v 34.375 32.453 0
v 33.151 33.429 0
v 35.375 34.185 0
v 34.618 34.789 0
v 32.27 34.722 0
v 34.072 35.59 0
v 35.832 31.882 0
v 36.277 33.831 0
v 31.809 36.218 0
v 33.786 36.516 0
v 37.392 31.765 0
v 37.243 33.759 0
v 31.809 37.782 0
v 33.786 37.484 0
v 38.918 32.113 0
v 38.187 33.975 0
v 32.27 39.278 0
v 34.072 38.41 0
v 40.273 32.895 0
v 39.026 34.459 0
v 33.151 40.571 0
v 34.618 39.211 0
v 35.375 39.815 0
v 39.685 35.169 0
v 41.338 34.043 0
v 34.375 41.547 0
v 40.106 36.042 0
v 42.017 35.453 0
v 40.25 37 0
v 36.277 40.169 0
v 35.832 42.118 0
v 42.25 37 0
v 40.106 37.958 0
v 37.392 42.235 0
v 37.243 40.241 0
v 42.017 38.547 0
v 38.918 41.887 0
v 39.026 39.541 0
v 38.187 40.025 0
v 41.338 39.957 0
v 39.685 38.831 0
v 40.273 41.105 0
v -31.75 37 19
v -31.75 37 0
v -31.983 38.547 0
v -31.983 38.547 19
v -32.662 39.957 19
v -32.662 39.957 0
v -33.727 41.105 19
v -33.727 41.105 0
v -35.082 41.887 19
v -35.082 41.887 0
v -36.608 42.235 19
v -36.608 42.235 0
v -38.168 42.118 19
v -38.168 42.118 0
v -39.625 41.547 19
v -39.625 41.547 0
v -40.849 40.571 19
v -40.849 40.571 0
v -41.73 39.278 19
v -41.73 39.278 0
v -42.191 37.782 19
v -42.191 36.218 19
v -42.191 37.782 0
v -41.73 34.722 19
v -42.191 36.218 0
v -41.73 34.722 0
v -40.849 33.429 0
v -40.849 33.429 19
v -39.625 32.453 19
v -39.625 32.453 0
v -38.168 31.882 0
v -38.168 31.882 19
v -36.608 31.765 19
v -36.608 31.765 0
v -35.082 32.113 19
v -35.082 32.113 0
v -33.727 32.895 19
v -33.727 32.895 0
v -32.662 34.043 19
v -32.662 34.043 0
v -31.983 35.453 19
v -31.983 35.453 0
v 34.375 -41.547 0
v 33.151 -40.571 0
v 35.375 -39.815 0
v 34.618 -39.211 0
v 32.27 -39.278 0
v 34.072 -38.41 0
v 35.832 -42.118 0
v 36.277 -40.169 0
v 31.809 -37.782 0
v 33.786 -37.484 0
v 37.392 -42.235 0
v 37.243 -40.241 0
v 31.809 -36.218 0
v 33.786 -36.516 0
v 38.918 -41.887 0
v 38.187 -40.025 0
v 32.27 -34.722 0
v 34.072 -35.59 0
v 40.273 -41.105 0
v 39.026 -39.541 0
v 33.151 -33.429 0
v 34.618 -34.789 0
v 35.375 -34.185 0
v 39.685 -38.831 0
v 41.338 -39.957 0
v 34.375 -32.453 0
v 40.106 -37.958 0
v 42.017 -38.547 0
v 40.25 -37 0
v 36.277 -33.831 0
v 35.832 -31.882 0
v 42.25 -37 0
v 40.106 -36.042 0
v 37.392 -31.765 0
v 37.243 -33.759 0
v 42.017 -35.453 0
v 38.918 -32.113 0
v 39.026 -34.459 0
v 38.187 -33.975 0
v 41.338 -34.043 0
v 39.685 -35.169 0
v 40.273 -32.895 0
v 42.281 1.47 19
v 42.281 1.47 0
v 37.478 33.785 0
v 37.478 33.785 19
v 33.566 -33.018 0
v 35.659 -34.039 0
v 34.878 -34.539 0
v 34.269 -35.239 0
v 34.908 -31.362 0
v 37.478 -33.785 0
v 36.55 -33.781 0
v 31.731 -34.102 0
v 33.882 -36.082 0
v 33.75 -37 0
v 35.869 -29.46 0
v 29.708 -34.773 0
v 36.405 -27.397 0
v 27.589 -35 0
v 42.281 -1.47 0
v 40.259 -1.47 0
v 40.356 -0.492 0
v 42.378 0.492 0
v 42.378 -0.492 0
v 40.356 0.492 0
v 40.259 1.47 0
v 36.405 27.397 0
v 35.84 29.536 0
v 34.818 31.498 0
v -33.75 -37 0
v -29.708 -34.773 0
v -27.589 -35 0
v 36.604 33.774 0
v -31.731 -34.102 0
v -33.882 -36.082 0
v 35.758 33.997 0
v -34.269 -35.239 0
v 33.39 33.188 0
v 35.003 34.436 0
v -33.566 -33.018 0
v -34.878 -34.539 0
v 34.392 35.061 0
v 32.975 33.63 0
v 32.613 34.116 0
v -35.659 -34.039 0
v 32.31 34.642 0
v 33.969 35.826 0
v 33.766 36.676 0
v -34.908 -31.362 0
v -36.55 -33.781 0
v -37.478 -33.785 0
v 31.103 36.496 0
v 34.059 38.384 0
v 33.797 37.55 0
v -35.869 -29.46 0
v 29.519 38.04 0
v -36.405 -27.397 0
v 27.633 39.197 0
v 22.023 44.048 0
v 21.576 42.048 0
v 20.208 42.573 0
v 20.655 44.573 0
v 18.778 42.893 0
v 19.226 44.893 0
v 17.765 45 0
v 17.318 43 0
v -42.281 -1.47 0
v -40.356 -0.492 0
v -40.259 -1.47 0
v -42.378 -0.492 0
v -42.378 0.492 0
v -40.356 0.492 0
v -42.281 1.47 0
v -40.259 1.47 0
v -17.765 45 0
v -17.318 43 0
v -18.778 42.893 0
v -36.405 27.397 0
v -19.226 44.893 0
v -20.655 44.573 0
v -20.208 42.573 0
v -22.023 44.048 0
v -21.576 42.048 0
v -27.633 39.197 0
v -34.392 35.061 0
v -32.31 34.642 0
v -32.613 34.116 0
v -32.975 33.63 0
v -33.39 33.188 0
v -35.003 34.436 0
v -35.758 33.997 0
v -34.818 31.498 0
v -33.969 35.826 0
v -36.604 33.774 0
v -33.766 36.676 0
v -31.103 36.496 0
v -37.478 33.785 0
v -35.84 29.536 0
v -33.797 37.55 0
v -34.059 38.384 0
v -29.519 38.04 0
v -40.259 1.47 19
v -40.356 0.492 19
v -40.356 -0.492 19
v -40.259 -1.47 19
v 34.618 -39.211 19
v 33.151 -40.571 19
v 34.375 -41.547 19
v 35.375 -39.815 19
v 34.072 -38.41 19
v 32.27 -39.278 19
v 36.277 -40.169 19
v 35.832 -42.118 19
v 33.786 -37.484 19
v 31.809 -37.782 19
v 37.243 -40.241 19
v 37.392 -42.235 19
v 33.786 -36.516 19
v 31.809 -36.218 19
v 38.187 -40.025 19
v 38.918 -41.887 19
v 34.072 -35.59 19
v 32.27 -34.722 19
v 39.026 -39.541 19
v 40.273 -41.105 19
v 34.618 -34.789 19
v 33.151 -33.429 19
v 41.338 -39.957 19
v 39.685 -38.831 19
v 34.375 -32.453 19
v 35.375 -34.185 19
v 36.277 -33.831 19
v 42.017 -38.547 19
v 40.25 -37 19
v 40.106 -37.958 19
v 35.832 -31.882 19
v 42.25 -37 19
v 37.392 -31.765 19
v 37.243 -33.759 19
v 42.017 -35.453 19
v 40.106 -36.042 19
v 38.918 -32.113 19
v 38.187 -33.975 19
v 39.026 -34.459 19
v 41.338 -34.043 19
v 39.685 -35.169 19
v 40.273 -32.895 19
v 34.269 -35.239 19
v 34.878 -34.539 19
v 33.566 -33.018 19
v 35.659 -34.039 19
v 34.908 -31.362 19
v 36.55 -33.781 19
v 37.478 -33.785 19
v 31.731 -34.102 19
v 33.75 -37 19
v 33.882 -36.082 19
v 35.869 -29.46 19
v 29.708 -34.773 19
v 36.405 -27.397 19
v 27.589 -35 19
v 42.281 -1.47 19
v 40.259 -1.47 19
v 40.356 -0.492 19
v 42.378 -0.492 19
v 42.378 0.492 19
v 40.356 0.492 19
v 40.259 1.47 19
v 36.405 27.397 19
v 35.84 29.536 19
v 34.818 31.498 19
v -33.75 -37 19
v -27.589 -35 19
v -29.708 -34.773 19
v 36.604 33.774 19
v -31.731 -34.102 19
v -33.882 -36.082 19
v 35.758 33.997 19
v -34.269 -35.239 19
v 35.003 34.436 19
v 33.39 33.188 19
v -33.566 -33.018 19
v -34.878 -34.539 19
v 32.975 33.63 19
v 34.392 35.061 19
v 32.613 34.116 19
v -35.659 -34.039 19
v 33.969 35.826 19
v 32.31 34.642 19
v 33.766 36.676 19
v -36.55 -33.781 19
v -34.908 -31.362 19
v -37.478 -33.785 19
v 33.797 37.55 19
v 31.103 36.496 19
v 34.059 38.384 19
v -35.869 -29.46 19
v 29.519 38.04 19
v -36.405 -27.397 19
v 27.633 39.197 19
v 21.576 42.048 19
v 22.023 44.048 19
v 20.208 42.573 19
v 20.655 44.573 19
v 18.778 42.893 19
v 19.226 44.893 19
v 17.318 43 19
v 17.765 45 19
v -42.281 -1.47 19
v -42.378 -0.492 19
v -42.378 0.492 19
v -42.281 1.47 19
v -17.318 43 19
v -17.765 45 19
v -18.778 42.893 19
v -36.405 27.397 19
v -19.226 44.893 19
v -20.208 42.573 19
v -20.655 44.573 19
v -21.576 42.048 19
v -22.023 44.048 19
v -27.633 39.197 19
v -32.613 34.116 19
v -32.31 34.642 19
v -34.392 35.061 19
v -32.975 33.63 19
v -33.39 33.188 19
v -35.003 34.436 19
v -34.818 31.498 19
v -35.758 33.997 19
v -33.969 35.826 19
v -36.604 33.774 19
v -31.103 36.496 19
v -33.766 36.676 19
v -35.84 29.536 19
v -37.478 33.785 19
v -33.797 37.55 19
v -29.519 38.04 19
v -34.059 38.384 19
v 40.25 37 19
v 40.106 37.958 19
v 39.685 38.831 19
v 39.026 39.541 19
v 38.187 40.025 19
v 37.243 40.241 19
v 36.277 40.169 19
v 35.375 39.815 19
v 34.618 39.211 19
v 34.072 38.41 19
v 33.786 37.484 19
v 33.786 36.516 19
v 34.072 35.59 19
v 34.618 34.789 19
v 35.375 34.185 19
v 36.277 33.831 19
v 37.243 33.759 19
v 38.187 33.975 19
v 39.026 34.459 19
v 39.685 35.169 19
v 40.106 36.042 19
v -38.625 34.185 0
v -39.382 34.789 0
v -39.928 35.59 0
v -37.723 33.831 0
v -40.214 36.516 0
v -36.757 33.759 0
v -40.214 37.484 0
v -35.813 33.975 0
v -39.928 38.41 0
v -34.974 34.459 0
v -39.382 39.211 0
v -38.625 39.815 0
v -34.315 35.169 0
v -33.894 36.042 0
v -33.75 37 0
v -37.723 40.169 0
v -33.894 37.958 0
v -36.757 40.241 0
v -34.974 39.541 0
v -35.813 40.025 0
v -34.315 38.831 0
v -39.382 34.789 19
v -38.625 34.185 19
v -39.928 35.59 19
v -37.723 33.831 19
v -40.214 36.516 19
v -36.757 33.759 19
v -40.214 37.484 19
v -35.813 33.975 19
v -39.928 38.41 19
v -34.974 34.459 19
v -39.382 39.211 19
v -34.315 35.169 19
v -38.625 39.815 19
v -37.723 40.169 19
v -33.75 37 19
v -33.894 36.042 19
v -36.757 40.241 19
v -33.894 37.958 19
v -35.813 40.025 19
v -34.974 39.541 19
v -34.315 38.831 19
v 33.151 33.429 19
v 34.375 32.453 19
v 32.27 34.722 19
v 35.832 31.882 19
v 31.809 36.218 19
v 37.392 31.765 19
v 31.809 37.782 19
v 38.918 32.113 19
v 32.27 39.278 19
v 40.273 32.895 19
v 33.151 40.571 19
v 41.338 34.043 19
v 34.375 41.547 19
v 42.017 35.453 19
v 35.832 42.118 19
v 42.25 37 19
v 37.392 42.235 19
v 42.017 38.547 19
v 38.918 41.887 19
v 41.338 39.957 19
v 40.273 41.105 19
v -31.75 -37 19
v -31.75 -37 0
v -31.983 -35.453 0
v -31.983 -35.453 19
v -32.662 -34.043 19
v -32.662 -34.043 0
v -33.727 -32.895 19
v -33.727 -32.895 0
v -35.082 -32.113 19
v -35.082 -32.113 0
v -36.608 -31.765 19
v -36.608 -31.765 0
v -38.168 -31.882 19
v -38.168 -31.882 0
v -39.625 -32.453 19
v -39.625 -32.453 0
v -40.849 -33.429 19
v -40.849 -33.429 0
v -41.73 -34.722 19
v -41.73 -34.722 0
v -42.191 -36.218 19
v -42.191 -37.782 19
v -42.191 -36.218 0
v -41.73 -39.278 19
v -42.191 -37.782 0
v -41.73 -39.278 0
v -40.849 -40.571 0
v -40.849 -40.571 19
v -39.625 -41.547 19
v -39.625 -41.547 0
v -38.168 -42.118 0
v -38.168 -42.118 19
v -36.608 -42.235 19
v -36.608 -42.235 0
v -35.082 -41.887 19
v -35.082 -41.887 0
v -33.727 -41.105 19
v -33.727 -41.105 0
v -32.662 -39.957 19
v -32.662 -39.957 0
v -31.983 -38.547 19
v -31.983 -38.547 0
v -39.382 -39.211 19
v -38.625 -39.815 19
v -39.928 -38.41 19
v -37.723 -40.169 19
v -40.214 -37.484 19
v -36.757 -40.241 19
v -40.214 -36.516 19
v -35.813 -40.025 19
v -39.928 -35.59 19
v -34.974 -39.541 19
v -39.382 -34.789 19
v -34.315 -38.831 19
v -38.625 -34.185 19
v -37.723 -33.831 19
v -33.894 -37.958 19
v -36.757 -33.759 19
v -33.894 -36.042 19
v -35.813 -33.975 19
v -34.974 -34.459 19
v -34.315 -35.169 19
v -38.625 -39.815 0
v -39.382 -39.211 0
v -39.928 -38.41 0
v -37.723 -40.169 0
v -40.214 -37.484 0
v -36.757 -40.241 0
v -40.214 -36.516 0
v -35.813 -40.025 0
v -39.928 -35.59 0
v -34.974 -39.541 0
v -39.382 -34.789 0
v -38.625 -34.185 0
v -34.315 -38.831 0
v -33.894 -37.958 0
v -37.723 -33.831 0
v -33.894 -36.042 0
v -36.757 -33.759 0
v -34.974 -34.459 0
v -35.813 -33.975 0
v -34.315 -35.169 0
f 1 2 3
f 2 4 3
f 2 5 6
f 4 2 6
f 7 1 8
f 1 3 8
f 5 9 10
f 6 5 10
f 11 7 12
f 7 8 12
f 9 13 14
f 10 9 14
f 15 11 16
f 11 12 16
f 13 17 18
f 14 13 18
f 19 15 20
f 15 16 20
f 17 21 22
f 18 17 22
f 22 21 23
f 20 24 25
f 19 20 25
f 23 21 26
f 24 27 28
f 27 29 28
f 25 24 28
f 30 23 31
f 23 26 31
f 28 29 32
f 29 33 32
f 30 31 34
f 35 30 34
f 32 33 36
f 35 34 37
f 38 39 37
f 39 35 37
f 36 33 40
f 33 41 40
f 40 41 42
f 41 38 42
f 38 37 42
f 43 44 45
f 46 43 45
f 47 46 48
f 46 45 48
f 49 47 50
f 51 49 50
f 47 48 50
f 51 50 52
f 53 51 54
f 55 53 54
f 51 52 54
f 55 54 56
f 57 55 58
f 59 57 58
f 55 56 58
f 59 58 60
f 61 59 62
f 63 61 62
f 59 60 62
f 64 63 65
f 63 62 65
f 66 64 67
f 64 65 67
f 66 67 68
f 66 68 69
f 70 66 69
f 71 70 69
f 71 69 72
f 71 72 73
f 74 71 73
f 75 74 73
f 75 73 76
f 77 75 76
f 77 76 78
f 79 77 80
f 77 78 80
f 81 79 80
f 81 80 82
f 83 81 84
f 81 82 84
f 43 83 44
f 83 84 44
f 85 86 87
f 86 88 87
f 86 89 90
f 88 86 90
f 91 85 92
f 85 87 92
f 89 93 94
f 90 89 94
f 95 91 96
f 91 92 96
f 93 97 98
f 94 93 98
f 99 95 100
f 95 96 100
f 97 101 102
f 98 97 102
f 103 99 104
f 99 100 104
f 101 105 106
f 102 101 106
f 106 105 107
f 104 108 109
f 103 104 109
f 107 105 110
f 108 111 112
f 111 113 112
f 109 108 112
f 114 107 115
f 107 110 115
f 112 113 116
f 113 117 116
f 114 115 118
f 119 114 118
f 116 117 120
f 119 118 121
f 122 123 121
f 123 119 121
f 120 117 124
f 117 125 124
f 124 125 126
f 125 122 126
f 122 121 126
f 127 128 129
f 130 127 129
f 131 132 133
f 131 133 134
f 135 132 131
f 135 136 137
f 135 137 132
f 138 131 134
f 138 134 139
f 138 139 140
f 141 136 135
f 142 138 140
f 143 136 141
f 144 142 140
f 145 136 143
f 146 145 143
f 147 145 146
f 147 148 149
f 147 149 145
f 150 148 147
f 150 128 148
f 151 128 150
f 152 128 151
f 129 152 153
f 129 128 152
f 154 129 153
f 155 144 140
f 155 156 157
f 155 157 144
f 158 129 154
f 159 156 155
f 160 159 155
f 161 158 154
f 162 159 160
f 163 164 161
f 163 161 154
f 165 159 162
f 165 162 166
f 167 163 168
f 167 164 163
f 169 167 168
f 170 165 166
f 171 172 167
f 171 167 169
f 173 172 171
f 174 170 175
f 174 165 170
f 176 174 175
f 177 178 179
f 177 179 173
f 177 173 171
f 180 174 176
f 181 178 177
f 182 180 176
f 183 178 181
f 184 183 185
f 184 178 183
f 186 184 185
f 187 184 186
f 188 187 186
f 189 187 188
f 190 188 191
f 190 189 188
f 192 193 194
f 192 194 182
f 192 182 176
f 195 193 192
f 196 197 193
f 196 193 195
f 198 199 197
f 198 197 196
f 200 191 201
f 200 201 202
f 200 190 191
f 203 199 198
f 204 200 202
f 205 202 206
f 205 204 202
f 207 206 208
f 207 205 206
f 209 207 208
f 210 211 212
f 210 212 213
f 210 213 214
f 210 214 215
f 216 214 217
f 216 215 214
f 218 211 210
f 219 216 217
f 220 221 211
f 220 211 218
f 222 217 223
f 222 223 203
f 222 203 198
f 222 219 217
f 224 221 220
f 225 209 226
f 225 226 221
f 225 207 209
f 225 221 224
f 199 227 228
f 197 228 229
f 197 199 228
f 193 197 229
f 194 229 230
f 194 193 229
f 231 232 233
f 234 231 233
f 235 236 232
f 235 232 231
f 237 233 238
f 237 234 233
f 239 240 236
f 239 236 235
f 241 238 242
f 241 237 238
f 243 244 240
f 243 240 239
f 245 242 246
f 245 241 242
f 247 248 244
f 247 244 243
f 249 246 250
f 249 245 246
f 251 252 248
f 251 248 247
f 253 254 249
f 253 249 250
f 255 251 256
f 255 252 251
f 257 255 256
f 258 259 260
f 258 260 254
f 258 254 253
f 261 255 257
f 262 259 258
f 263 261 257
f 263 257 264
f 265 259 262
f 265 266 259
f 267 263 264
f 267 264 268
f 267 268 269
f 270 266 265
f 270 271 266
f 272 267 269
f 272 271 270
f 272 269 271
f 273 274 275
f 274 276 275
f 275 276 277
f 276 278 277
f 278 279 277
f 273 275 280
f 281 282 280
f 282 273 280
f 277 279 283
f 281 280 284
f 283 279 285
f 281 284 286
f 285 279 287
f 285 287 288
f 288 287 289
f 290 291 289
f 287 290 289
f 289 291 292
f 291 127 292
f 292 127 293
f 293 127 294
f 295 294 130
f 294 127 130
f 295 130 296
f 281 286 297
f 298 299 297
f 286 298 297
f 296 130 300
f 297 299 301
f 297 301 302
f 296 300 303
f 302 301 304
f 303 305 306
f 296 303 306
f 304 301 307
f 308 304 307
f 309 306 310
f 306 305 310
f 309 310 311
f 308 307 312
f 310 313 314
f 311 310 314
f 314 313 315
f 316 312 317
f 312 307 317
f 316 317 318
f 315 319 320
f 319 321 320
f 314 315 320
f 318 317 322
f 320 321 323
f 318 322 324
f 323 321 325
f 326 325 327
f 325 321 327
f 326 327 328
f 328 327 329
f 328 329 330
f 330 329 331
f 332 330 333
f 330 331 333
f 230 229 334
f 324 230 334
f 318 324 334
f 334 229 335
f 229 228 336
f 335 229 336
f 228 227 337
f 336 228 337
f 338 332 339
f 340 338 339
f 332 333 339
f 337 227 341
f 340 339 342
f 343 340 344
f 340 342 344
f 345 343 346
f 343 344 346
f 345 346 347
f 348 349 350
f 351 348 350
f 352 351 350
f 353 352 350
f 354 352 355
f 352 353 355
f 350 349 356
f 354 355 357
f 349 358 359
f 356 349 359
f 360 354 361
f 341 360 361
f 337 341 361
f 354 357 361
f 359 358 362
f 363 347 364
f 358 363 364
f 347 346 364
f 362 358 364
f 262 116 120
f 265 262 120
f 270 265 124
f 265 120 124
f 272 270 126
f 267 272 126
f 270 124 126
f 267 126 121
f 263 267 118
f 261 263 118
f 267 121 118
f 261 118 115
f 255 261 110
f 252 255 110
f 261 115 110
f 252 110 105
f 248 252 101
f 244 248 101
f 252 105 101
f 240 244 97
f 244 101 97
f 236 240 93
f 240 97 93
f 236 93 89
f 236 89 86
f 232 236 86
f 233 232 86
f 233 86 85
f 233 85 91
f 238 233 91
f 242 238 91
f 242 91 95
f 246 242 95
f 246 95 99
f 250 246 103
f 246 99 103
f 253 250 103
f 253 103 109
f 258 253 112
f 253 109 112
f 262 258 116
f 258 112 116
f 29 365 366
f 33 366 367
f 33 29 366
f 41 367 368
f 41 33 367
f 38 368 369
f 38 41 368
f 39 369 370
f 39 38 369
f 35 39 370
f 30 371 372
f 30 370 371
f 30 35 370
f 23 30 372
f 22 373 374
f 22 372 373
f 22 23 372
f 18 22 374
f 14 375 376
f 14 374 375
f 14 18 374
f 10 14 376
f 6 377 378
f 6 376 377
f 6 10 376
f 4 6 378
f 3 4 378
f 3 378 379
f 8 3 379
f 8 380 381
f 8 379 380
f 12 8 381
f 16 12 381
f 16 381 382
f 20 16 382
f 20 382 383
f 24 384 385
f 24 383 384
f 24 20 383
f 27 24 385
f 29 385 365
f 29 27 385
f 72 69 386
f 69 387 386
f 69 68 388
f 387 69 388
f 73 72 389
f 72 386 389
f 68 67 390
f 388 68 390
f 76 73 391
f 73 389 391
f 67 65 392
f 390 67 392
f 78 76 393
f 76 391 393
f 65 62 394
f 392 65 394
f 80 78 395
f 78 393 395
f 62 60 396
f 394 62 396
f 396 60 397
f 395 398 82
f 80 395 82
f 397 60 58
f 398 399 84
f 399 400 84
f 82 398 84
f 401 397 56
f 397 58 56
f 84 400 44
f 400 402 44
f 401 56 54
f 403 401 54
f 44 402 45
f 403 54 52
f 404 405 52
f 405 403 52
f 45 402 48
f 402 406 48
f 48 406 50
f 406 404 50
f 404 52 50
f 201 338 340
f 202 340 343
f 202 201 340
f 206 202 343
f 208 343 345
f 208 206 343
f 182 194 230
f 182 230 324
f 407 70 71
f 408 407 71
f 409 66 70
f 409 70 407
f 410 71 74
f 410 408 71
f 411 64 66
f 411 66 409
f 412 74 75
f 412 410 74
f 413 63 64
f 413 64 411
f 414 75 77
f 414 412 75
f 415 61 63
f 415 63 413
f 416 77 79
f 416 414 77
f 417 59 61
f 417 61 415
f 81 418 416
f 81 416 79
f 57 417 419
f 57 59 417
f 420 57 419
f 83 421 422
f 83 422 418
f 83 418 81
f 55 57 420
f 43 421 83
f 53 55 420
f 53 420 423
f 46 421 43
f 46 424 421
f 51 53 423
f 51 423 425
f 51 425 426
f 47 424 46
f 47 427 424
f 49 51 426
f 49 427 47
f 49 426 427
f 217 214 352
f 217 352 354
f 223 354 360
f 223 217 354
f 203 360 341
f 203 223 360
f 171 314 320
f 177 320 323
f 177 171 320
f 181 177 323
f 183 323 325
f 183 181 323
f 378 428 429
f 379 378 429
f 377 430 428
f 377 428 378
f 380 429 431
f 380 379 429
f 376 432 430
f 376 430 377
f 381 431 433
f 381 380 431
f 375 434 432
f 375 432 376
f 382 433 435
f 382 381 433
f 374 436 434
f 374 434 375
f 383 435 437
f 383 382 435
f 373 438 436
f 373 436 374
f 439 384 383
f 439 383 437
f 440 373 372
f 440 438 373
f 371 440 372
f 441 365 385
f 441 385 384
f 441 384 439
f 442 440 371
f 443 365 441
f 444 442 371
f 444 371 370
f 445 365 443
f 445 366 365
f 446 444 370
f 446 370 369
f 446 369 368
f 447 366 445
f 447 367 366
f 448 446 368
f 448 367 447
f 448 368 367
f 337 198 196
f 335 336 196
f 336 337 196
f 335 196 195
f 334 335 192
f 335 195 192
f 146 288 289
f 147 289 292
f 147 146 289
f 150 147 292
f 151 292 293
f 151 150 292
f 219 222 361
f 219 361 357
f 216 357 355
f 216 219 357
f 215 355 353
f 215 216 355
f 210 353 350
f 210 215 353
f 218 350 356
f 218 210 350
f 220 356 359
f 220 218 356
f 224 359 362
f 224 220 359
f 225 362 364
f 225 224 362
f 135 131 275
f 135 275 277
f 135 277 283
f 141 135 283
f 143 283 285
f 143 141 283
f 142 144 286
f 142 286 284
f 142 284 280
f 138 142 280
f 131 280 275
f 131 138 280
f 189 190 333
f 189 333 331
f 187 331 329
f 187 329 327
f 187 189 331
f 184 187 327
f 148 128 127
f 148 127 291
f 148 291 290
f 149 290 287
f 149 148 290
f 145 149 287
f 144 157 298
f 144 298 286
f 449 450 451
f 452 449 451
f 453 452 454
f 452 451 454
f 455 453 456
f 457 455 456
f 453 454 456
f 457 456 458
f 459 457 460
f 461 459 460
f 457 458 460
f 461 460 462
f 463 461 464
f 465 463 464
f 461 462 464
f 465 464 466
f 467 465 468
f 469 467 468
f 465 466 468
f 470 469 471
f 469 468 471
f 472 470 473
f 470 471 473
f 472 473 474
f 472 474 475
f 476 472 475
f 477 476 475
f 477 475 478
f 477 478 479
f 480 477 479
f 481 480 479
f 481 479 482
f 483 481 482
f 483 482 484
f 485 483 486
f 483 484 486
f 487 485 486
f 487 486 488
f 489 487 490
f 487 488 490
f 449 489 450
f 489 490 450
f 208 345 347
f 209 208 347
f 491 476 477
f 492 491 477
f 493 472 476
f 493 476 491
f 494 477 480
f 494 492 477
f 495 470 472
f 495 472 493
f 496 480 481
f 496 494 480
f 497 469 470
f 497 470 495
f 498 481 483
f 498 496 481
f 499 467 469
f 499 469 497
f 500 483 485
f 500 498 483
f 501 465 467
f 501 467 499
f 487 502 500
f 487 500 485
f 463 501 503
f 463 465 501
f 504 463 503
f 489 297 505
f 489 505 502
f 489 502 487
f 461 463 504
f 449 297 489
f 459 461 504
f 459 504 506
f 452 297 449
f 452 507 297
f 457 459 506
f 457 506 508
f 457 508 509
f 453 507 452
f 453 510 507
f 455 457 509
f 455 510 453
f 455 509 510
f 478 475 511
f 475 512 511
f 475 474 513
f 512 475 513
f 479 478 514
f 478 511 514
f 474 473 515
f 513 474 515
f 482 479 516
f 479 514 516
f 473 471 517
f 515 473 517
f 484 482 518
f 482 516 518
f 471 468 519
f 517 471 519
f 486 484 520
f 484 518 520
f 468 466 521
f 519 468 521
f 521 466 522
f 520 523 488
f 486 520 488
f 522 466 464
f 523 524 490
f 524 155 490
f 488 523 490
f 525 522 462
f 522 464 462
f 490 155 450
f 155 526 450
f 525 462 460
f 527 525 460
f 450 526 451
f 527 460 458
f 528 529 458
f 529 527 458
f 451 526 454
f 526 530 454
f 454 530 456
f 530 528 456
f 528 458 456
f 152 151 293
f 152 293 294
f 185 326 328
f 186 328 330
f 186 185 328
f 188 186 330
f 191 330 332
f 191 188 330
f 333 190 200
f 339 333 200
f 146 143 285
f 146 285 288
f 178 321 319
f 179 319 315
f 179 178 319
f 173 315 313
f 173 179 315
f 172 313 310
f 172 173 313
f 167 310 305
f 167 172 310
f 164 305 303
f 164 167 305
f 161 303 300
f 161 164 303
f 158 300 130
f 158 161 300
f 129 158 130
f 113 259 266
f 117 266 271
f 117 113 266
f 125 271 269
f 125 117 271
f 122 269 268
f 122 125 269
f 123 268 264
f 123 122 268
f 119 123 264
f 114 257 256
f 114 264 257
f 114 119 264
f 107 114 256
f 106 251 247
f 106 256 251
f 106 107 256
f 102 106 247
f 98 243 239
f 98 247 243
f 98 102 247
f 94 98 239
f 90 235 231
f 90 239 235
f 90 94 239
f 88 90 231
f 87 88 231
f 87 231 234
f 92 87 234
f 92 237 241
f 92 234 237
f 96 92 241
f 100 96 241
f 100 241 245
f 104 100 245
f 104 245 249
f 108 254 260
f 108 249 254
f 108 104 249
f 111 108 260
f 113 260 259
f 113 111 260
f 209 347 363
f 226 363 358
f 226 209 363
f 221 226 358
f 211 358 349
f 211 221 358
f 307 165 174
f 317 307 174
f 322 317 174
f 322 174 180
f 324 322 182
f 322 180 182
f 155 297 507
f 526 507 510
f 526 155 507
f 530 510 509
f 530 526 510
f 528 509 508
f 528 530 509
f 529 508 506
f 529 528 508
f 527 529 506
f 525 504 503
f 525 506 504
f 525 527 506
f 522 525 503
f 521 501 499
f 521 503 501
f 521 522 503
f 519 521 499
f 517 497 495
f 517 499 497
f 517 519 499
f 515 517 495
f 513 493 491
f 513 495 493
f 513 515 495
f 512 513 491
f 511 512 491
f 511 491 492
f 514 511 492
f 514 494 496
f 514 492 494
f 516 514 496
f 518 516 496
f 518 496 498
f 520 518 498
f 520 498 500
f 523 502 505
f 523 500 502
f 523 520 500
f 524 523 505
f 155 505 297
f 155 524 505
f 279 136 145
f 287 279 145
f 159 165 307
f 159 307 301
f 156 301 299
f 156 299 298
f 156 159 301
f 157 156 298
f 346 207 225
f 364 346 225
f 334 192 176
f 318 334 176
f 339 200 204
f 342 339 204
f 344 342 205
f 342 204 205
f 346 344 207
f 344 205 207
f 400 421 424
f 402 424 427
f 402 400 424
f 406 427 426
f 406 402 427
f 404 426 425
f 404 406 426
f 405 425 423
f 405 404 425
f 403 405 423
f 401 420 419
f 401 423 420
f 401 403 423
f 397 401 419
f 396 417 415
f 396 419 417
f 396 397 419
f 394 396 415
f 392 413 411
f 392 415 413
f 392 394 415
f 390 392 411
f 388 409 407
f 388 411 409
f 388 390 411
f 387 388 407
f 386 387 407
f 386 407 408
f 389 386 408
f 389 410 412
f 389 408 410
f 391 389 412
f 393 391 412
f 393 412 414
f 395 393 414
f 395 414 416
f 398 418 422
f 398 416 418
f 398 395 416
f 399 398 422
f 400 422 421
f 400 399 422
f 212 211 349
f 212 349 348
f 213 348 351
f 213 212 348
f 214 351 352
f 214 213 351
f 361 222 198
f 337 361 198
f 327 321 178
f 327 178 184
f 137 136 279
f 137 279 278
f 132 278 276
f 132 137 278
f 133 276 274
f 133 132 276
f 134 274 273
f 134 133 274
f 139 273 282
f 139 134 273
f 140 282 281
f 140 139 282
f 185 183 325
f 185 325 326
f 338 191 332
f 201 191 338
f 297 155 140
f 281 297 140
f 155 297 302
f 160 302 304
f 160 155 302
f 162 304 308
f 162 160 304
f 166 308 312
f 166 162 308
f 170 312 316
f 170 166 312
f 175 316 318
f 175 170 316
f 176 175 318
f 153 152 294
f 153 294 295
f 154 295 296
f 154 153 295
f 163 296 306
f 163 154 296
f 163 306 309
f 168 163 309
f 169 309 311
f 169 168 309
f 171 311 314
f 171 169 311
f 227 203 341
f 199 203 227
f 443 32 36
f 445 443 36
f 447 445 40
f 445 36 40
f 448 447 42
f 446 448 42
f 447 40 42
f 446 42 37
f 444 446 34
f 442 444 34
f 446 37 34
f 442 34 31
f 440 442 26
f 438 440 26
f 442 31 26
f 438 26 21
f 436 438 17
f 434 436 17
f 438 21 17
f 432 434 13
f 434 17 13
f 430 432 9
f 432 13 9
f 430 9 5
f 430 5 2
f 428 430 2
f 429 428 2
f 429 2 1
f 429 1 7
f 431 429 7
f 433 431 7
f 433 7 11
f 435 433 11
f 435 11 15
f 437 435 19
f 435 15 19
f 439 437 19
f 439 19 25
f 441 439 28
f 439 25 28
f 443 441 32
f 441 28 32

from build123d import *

# Parameters (mm, degrees)
F0_R        = 5.25
F1_DEPTH    = 19
F3_DEPTH    = 19
F4_R        = 3.25
F5_DEPTH    = 25
F7_DEPTH    = 25
F8_T1_DEPTH = 19
F8_T3_DEPTH = 26.4324324324
F8_T5_DEPTH = 30.1768389253


# Not quite as in the source:
# - a fillet or chamfer that OpenCascade refuses, or shapes differently, is made with other operations: its cross-section is extruded or revolved along the edge and cut away or added


with BuildPart() as f1:
    # F0 (on Top) → F1 (new body)
    with BuildSketch(Plane.XY):
        with Locations((-37, 37)):
            Circle(F0_R)
    extrude(amount=F1_DEPTH)


with BuildPart() as f1b:
    # F0 (on Top) → F1, piece 2 (new body)
    with BuildSketch(Plane.XY):
        with Locations((37, 37)):
            Circle(F0_R)
    extrude(amount=F1_DEPTH)


with BuildPart() as f1c:
    # F0 (on Top) → F1, piece 3 (new body)
    with BuildSketch(Plane.XY):
        with Locations((37, -37)):
            Circle(F0_R)
    extrude(amount=F1_DEPTH)


with BuildPart() as f1d:
    # F0 (on Top) → F1, piece 4 (new body)
    with BuildSketch(Plane.XY):
        with Locations((-37, -37)):
            Circle(F0_R)
    extrude(amount=F1_DEPTH)


with BuildPart() as f3:
    # F2 (on Top) → F3 (new body)
    with BuildSketch(Plane.XY):
        Polygon((20, 45), (-20, 45), (-37, 37), (-42.5, 0), (-37, -37), (37, -37), (42.5, 0), (37, 37), align=None)
    extrude(amount=F3_DEPTH)


with BuildPart() as f5_tool:
    # F4 (on Top) → F5 (new body)
    with BuildSketch(Plane.XY):
        with Locations((-37, 37)):
            Circle(F4_R)
        with Locations((37, 37)):
            Circle(F4_R)
        with Locations((37, -37)):
            Circle(F4_R)
        with Locations((-37, -37)):
            Circle(F4_R)
    extrude(amount=F5_DEPTH)


with BuildPart() as f1_1:
    add(f1.part)

    # F5: cut by f5_tool
    add(f5_tool.part, mode=Mode.SUBTRACT)


with BuildPart() as f1b_1:
    add(f1b.part)

    # F5: cut by f5_tool
    add(f5_tool.part, mode=Mode.SUBTRACT)


with BuildPart() as f1c_1:
    add(f1c.part)

    # F5: cut by f5_tool
    add(f5_tool.part, mode=Mode.SUBTRACT)


with BuildPart() as f1d_1:
    add(f1d.part)

    # F5: cut by f5_tool
    add(f5_tool.part, mode=Mode.SUBTRACT)


with BuildPart() as f3_1:
    add(f3.part)

    # F5: cut by f5_tool
    add(f5_tool.part, mode=Mode.SUBTRACT)

    # F6 (on Top) → F7 (cut)
    with BuildSketch(Plane.XY):
        with BuildLine():
            Line((19.552926443, 43), (-19.552926443, 43))
            Line((-19.552926443, 43), (-31.7563055954, 37.25723334))
            ThreePointArc((-31.7563055954, 37.25723334), (-32.7866811629, 33.8678371088), (-35.7354533115, 31.9045685489))
            Line((-35.7354533115, 31.9045685489), (-40.478024312, 0))
            Line((-40.478024312, 0), (-35.7354533115, -31.9045685489))
            ThreePointArc((-35.7354533115, -31.9045685489), (-33.571450675, -33.0241290858), (-32.1458780403, -35))
            Line((-32.1458780403, -35), (32.1458780403, -35))
            ThreePointArc((32.1458780403, -35), (33.571450675, -33.0241290858), (35.7354533115, -31.9045685489))
            Line((35.7354533115, -31.9045685489), (40.478024312, 0))
            Line((40.478024312, 0), (35.7354533115, 31.9045685489))
            ThreePointArc((35.7354533115, 31.9045685489), (32.7866811629, 33.8678371088), (31.7563055954, 37.25723334))
            Line((31.7563055954, 37.25723334), (19.552926443, 43))
        make_face()
    extrude(amount=F7_DEPTH, mode=Mode.SUBTRACT)

    # F8: fillet of radius 10 on 16 edges, made by hand

    # F8_s2 → F8_t1 (join)
    with BuildSketch(Plane.XY):
        with BuildLine():
            ThreePointArc((21.5755290212, 42.048187022), (19.4990867668, 42.7591462285), (17.3175586579, 43))
            Line((17.3175586579, 43), (19.552926443, 43))
            Line((19.552926443, 43), (21.5755290212, 42.048187022))
        make_face()
        with BuildLine():
            ThreePointArc((-17.3175586579, 43), (-19.4990867668, 42.7591462285), (-21.5755290212, 42.048187022))
            Line((-21.5755290212, 42.048187022), (-19.552926443, 43))
            Line((-19.552926443, 43), (-17.3175586579, 43))
        make_face()
        with BuildLine():
            ThreePointArc((-40.2594616371, 1.4703307219), (-40.3681458718, 0), (-40.2594616371, -1.4703307219))
            Line((-40.2594616371, -1.4703307219), (-40.478024312, 0))
            Line((-40.478024312, 0), (-40.2594616371, 1.4703307219))
        make_face()
        with BuildLine():
            ThreePointArc((40.2594616371, -1.4703307219), (40.3681458718, 0), (40.2594616371, 1.4703307219))
            Line((40.2594616371, 1.4703307219), (40.478024312, 0))
            Line((40.478024312, 0), (40.2594616371, -1.4703307219))
        make_face()
        with BuildLine():
            ThreePointArc((-33.3901050909, 33.188024299), (-35.3836316287, 30.5457403999), (-36.405430553, 27.3974489237))
            Line((-36.405430553, 27.3974489237), (-35.7354533115, 31.9045685489))
            ThreePointArc((-35.7354533115, 31.9045685489), (-34.4797103564, 32.3944989293), (-33.3901050909, 33.188024299))
        make_face()
        with BuildLine():
            ThreePointArc((-27.6333696517, 39.19743849), (-30.3537332547, 37.3118526055), (-32.3095636894, 34.6415455874))
            ThreePointArc((-32.3095636894, 34.6415455874), (-31.8636400174, 35.9135810529), (-31.7563055954, 37.25723334))
            Line((-31.7563055954, 37.25723334), (-27.6333696517, 39.19743849))
        make_face()
        with BuildLine():
            ThreePointArc((-33.3901050909, -33.188024299), (-35.3836316287, -30.5457403999), (-36.405430553, -27.3974489237))
            Line((-36.405430553, -27.3974489237), (-35.7354533115, -31.9045685489))
            ThreePointArc((-35.7354533115, -31.9045685489), (-34.4797103564, -32.3944989293), (-33.3901050909, -33.188024299))
        make_face()
        with BuildLine():
            ThreePointArc((-33.7602284039, -32.868852459), (-30.8535476338, -34.452209387), (-27.5892348876, -35))
            Line((-27.5892348876, -35), (-32.1458780403, -35))
            ThreePointArc((-32.1458780403, -35), (-32.8151193944, -33.8299409601), (-33.7602284039, -32.868852459))
        make_face()
        with BuildLine():
            ThreePointArc((36.405430553, 27.3974489237), (35.3836316287, 30.5457403999), (33.3901050909, 33.188024299))
            ThreePointArc((33.3901050909, 33.188024299), (34.4797103564, 32.3944989293), (35.7354533115, 31.9045685489))
            Line((35.7354533115, 31.9045685489), (36.405430553, 27.3974489237))
        make_face()
        with BuildLine():
            ThreePointArc((32.3095636894, 34.6415455874), (30.3537332547, 37.3118526055), (27.6333696517, 39.19743849))
            Line((27.6333696517, 39.19743849), (31.7563055954, 37.25723334))
            ThreePointArc((31.7563055954, 37.25723334), (31.8636400174, 35.9135810529), (32.3095636894, 34.6415455874))
        make_face()
        with BuildLine():
            ThreePointArc((27.5892348876, -35), (30.8535476338, -34.452209387), (33.7602284039, -32.868852459))
            ThreePointArc((33.7602284039, -32.868852459), (32.8151193944, -33.8299409601), (32.1458780403, -35))
            Line((32.1458780403, -35), (27.5892348876, -35))
        make_face()
        with BuildLine():
            ThreePointArc((33.3901050909, -33.188024299), (35.3836316287, -30.5457403999), (36.405430553, -27.3974489237))
            Line((36.405430553, -27.3974489237), (35.7354533115, -31.9045685489))
            ThreePointArc((35.7354533115, -31.9045685489), (34.4797103564, -32.3944989293), (33.3901050909, -33.188024299))
        make_face()
    extrude(amount=F8_T1_DEPTH)

    # F8_s4 → F8_t3 (cut)
    with BuildSketch(Plane.XY.offset(-3.7162162162)):
        with BuildLine():
            ThreePointArc((42.2814373251, 1.4703307219), (42.3901215599, 0), (42.2814373251, -1.4703307219))
            Line((42.2814373251, -1.4703307219), (42.5, 0))
            Line((42.5, 0), (42.2814373251, 1.4703307219))
        make_face()
        with BuildLine():
            ThreePointArc((-42.2814373251, 1.4703307219), (-42.3901215599, 0), (-42.2814373251, -1.4703307219))
            Line((-42.2814373251, -1.4703307219), (-42.5, 0))
            Line((-42.5, 0), (-42.2814373251, 1.4703307219))
        make_face()
    extrude(amount=F8_T3_DEPTH, mode=Mode.SUBTRACT)

    # F8_s6 → F8_t5 (cut)
    with BuildSketch(Plane.XY.offset(-5.5884194627)):
        with BuildLine():
            ThreePointArc((-17.7646322149, 45), (-19.9461603238, 44.7591462285), (-22.0226025782, 44.048187022))
            Line((-22.0226025782, 44.048187022), (-20, 45))
            Line((-20, 45), (-17.7646322149, 45))
        make_face()
        with BuildLine():
            ThreePointArc((17.7646322149, 45), (19.9461603238, 44.7591462285), (22.0226025782, 44.048187022))
            Line((22.0226025782, 44.048187022), (20, 45))
            Line((20, 45), (17.7646322149, 45))
        make_face()
    extrude(amount=F8_T5_DEPTH, mode=Mode.SUBTRACT)


solid = Compound([f1_1.part, f1b_1.part, f1c_1.part, f1d_1.part, f3_1.part])
